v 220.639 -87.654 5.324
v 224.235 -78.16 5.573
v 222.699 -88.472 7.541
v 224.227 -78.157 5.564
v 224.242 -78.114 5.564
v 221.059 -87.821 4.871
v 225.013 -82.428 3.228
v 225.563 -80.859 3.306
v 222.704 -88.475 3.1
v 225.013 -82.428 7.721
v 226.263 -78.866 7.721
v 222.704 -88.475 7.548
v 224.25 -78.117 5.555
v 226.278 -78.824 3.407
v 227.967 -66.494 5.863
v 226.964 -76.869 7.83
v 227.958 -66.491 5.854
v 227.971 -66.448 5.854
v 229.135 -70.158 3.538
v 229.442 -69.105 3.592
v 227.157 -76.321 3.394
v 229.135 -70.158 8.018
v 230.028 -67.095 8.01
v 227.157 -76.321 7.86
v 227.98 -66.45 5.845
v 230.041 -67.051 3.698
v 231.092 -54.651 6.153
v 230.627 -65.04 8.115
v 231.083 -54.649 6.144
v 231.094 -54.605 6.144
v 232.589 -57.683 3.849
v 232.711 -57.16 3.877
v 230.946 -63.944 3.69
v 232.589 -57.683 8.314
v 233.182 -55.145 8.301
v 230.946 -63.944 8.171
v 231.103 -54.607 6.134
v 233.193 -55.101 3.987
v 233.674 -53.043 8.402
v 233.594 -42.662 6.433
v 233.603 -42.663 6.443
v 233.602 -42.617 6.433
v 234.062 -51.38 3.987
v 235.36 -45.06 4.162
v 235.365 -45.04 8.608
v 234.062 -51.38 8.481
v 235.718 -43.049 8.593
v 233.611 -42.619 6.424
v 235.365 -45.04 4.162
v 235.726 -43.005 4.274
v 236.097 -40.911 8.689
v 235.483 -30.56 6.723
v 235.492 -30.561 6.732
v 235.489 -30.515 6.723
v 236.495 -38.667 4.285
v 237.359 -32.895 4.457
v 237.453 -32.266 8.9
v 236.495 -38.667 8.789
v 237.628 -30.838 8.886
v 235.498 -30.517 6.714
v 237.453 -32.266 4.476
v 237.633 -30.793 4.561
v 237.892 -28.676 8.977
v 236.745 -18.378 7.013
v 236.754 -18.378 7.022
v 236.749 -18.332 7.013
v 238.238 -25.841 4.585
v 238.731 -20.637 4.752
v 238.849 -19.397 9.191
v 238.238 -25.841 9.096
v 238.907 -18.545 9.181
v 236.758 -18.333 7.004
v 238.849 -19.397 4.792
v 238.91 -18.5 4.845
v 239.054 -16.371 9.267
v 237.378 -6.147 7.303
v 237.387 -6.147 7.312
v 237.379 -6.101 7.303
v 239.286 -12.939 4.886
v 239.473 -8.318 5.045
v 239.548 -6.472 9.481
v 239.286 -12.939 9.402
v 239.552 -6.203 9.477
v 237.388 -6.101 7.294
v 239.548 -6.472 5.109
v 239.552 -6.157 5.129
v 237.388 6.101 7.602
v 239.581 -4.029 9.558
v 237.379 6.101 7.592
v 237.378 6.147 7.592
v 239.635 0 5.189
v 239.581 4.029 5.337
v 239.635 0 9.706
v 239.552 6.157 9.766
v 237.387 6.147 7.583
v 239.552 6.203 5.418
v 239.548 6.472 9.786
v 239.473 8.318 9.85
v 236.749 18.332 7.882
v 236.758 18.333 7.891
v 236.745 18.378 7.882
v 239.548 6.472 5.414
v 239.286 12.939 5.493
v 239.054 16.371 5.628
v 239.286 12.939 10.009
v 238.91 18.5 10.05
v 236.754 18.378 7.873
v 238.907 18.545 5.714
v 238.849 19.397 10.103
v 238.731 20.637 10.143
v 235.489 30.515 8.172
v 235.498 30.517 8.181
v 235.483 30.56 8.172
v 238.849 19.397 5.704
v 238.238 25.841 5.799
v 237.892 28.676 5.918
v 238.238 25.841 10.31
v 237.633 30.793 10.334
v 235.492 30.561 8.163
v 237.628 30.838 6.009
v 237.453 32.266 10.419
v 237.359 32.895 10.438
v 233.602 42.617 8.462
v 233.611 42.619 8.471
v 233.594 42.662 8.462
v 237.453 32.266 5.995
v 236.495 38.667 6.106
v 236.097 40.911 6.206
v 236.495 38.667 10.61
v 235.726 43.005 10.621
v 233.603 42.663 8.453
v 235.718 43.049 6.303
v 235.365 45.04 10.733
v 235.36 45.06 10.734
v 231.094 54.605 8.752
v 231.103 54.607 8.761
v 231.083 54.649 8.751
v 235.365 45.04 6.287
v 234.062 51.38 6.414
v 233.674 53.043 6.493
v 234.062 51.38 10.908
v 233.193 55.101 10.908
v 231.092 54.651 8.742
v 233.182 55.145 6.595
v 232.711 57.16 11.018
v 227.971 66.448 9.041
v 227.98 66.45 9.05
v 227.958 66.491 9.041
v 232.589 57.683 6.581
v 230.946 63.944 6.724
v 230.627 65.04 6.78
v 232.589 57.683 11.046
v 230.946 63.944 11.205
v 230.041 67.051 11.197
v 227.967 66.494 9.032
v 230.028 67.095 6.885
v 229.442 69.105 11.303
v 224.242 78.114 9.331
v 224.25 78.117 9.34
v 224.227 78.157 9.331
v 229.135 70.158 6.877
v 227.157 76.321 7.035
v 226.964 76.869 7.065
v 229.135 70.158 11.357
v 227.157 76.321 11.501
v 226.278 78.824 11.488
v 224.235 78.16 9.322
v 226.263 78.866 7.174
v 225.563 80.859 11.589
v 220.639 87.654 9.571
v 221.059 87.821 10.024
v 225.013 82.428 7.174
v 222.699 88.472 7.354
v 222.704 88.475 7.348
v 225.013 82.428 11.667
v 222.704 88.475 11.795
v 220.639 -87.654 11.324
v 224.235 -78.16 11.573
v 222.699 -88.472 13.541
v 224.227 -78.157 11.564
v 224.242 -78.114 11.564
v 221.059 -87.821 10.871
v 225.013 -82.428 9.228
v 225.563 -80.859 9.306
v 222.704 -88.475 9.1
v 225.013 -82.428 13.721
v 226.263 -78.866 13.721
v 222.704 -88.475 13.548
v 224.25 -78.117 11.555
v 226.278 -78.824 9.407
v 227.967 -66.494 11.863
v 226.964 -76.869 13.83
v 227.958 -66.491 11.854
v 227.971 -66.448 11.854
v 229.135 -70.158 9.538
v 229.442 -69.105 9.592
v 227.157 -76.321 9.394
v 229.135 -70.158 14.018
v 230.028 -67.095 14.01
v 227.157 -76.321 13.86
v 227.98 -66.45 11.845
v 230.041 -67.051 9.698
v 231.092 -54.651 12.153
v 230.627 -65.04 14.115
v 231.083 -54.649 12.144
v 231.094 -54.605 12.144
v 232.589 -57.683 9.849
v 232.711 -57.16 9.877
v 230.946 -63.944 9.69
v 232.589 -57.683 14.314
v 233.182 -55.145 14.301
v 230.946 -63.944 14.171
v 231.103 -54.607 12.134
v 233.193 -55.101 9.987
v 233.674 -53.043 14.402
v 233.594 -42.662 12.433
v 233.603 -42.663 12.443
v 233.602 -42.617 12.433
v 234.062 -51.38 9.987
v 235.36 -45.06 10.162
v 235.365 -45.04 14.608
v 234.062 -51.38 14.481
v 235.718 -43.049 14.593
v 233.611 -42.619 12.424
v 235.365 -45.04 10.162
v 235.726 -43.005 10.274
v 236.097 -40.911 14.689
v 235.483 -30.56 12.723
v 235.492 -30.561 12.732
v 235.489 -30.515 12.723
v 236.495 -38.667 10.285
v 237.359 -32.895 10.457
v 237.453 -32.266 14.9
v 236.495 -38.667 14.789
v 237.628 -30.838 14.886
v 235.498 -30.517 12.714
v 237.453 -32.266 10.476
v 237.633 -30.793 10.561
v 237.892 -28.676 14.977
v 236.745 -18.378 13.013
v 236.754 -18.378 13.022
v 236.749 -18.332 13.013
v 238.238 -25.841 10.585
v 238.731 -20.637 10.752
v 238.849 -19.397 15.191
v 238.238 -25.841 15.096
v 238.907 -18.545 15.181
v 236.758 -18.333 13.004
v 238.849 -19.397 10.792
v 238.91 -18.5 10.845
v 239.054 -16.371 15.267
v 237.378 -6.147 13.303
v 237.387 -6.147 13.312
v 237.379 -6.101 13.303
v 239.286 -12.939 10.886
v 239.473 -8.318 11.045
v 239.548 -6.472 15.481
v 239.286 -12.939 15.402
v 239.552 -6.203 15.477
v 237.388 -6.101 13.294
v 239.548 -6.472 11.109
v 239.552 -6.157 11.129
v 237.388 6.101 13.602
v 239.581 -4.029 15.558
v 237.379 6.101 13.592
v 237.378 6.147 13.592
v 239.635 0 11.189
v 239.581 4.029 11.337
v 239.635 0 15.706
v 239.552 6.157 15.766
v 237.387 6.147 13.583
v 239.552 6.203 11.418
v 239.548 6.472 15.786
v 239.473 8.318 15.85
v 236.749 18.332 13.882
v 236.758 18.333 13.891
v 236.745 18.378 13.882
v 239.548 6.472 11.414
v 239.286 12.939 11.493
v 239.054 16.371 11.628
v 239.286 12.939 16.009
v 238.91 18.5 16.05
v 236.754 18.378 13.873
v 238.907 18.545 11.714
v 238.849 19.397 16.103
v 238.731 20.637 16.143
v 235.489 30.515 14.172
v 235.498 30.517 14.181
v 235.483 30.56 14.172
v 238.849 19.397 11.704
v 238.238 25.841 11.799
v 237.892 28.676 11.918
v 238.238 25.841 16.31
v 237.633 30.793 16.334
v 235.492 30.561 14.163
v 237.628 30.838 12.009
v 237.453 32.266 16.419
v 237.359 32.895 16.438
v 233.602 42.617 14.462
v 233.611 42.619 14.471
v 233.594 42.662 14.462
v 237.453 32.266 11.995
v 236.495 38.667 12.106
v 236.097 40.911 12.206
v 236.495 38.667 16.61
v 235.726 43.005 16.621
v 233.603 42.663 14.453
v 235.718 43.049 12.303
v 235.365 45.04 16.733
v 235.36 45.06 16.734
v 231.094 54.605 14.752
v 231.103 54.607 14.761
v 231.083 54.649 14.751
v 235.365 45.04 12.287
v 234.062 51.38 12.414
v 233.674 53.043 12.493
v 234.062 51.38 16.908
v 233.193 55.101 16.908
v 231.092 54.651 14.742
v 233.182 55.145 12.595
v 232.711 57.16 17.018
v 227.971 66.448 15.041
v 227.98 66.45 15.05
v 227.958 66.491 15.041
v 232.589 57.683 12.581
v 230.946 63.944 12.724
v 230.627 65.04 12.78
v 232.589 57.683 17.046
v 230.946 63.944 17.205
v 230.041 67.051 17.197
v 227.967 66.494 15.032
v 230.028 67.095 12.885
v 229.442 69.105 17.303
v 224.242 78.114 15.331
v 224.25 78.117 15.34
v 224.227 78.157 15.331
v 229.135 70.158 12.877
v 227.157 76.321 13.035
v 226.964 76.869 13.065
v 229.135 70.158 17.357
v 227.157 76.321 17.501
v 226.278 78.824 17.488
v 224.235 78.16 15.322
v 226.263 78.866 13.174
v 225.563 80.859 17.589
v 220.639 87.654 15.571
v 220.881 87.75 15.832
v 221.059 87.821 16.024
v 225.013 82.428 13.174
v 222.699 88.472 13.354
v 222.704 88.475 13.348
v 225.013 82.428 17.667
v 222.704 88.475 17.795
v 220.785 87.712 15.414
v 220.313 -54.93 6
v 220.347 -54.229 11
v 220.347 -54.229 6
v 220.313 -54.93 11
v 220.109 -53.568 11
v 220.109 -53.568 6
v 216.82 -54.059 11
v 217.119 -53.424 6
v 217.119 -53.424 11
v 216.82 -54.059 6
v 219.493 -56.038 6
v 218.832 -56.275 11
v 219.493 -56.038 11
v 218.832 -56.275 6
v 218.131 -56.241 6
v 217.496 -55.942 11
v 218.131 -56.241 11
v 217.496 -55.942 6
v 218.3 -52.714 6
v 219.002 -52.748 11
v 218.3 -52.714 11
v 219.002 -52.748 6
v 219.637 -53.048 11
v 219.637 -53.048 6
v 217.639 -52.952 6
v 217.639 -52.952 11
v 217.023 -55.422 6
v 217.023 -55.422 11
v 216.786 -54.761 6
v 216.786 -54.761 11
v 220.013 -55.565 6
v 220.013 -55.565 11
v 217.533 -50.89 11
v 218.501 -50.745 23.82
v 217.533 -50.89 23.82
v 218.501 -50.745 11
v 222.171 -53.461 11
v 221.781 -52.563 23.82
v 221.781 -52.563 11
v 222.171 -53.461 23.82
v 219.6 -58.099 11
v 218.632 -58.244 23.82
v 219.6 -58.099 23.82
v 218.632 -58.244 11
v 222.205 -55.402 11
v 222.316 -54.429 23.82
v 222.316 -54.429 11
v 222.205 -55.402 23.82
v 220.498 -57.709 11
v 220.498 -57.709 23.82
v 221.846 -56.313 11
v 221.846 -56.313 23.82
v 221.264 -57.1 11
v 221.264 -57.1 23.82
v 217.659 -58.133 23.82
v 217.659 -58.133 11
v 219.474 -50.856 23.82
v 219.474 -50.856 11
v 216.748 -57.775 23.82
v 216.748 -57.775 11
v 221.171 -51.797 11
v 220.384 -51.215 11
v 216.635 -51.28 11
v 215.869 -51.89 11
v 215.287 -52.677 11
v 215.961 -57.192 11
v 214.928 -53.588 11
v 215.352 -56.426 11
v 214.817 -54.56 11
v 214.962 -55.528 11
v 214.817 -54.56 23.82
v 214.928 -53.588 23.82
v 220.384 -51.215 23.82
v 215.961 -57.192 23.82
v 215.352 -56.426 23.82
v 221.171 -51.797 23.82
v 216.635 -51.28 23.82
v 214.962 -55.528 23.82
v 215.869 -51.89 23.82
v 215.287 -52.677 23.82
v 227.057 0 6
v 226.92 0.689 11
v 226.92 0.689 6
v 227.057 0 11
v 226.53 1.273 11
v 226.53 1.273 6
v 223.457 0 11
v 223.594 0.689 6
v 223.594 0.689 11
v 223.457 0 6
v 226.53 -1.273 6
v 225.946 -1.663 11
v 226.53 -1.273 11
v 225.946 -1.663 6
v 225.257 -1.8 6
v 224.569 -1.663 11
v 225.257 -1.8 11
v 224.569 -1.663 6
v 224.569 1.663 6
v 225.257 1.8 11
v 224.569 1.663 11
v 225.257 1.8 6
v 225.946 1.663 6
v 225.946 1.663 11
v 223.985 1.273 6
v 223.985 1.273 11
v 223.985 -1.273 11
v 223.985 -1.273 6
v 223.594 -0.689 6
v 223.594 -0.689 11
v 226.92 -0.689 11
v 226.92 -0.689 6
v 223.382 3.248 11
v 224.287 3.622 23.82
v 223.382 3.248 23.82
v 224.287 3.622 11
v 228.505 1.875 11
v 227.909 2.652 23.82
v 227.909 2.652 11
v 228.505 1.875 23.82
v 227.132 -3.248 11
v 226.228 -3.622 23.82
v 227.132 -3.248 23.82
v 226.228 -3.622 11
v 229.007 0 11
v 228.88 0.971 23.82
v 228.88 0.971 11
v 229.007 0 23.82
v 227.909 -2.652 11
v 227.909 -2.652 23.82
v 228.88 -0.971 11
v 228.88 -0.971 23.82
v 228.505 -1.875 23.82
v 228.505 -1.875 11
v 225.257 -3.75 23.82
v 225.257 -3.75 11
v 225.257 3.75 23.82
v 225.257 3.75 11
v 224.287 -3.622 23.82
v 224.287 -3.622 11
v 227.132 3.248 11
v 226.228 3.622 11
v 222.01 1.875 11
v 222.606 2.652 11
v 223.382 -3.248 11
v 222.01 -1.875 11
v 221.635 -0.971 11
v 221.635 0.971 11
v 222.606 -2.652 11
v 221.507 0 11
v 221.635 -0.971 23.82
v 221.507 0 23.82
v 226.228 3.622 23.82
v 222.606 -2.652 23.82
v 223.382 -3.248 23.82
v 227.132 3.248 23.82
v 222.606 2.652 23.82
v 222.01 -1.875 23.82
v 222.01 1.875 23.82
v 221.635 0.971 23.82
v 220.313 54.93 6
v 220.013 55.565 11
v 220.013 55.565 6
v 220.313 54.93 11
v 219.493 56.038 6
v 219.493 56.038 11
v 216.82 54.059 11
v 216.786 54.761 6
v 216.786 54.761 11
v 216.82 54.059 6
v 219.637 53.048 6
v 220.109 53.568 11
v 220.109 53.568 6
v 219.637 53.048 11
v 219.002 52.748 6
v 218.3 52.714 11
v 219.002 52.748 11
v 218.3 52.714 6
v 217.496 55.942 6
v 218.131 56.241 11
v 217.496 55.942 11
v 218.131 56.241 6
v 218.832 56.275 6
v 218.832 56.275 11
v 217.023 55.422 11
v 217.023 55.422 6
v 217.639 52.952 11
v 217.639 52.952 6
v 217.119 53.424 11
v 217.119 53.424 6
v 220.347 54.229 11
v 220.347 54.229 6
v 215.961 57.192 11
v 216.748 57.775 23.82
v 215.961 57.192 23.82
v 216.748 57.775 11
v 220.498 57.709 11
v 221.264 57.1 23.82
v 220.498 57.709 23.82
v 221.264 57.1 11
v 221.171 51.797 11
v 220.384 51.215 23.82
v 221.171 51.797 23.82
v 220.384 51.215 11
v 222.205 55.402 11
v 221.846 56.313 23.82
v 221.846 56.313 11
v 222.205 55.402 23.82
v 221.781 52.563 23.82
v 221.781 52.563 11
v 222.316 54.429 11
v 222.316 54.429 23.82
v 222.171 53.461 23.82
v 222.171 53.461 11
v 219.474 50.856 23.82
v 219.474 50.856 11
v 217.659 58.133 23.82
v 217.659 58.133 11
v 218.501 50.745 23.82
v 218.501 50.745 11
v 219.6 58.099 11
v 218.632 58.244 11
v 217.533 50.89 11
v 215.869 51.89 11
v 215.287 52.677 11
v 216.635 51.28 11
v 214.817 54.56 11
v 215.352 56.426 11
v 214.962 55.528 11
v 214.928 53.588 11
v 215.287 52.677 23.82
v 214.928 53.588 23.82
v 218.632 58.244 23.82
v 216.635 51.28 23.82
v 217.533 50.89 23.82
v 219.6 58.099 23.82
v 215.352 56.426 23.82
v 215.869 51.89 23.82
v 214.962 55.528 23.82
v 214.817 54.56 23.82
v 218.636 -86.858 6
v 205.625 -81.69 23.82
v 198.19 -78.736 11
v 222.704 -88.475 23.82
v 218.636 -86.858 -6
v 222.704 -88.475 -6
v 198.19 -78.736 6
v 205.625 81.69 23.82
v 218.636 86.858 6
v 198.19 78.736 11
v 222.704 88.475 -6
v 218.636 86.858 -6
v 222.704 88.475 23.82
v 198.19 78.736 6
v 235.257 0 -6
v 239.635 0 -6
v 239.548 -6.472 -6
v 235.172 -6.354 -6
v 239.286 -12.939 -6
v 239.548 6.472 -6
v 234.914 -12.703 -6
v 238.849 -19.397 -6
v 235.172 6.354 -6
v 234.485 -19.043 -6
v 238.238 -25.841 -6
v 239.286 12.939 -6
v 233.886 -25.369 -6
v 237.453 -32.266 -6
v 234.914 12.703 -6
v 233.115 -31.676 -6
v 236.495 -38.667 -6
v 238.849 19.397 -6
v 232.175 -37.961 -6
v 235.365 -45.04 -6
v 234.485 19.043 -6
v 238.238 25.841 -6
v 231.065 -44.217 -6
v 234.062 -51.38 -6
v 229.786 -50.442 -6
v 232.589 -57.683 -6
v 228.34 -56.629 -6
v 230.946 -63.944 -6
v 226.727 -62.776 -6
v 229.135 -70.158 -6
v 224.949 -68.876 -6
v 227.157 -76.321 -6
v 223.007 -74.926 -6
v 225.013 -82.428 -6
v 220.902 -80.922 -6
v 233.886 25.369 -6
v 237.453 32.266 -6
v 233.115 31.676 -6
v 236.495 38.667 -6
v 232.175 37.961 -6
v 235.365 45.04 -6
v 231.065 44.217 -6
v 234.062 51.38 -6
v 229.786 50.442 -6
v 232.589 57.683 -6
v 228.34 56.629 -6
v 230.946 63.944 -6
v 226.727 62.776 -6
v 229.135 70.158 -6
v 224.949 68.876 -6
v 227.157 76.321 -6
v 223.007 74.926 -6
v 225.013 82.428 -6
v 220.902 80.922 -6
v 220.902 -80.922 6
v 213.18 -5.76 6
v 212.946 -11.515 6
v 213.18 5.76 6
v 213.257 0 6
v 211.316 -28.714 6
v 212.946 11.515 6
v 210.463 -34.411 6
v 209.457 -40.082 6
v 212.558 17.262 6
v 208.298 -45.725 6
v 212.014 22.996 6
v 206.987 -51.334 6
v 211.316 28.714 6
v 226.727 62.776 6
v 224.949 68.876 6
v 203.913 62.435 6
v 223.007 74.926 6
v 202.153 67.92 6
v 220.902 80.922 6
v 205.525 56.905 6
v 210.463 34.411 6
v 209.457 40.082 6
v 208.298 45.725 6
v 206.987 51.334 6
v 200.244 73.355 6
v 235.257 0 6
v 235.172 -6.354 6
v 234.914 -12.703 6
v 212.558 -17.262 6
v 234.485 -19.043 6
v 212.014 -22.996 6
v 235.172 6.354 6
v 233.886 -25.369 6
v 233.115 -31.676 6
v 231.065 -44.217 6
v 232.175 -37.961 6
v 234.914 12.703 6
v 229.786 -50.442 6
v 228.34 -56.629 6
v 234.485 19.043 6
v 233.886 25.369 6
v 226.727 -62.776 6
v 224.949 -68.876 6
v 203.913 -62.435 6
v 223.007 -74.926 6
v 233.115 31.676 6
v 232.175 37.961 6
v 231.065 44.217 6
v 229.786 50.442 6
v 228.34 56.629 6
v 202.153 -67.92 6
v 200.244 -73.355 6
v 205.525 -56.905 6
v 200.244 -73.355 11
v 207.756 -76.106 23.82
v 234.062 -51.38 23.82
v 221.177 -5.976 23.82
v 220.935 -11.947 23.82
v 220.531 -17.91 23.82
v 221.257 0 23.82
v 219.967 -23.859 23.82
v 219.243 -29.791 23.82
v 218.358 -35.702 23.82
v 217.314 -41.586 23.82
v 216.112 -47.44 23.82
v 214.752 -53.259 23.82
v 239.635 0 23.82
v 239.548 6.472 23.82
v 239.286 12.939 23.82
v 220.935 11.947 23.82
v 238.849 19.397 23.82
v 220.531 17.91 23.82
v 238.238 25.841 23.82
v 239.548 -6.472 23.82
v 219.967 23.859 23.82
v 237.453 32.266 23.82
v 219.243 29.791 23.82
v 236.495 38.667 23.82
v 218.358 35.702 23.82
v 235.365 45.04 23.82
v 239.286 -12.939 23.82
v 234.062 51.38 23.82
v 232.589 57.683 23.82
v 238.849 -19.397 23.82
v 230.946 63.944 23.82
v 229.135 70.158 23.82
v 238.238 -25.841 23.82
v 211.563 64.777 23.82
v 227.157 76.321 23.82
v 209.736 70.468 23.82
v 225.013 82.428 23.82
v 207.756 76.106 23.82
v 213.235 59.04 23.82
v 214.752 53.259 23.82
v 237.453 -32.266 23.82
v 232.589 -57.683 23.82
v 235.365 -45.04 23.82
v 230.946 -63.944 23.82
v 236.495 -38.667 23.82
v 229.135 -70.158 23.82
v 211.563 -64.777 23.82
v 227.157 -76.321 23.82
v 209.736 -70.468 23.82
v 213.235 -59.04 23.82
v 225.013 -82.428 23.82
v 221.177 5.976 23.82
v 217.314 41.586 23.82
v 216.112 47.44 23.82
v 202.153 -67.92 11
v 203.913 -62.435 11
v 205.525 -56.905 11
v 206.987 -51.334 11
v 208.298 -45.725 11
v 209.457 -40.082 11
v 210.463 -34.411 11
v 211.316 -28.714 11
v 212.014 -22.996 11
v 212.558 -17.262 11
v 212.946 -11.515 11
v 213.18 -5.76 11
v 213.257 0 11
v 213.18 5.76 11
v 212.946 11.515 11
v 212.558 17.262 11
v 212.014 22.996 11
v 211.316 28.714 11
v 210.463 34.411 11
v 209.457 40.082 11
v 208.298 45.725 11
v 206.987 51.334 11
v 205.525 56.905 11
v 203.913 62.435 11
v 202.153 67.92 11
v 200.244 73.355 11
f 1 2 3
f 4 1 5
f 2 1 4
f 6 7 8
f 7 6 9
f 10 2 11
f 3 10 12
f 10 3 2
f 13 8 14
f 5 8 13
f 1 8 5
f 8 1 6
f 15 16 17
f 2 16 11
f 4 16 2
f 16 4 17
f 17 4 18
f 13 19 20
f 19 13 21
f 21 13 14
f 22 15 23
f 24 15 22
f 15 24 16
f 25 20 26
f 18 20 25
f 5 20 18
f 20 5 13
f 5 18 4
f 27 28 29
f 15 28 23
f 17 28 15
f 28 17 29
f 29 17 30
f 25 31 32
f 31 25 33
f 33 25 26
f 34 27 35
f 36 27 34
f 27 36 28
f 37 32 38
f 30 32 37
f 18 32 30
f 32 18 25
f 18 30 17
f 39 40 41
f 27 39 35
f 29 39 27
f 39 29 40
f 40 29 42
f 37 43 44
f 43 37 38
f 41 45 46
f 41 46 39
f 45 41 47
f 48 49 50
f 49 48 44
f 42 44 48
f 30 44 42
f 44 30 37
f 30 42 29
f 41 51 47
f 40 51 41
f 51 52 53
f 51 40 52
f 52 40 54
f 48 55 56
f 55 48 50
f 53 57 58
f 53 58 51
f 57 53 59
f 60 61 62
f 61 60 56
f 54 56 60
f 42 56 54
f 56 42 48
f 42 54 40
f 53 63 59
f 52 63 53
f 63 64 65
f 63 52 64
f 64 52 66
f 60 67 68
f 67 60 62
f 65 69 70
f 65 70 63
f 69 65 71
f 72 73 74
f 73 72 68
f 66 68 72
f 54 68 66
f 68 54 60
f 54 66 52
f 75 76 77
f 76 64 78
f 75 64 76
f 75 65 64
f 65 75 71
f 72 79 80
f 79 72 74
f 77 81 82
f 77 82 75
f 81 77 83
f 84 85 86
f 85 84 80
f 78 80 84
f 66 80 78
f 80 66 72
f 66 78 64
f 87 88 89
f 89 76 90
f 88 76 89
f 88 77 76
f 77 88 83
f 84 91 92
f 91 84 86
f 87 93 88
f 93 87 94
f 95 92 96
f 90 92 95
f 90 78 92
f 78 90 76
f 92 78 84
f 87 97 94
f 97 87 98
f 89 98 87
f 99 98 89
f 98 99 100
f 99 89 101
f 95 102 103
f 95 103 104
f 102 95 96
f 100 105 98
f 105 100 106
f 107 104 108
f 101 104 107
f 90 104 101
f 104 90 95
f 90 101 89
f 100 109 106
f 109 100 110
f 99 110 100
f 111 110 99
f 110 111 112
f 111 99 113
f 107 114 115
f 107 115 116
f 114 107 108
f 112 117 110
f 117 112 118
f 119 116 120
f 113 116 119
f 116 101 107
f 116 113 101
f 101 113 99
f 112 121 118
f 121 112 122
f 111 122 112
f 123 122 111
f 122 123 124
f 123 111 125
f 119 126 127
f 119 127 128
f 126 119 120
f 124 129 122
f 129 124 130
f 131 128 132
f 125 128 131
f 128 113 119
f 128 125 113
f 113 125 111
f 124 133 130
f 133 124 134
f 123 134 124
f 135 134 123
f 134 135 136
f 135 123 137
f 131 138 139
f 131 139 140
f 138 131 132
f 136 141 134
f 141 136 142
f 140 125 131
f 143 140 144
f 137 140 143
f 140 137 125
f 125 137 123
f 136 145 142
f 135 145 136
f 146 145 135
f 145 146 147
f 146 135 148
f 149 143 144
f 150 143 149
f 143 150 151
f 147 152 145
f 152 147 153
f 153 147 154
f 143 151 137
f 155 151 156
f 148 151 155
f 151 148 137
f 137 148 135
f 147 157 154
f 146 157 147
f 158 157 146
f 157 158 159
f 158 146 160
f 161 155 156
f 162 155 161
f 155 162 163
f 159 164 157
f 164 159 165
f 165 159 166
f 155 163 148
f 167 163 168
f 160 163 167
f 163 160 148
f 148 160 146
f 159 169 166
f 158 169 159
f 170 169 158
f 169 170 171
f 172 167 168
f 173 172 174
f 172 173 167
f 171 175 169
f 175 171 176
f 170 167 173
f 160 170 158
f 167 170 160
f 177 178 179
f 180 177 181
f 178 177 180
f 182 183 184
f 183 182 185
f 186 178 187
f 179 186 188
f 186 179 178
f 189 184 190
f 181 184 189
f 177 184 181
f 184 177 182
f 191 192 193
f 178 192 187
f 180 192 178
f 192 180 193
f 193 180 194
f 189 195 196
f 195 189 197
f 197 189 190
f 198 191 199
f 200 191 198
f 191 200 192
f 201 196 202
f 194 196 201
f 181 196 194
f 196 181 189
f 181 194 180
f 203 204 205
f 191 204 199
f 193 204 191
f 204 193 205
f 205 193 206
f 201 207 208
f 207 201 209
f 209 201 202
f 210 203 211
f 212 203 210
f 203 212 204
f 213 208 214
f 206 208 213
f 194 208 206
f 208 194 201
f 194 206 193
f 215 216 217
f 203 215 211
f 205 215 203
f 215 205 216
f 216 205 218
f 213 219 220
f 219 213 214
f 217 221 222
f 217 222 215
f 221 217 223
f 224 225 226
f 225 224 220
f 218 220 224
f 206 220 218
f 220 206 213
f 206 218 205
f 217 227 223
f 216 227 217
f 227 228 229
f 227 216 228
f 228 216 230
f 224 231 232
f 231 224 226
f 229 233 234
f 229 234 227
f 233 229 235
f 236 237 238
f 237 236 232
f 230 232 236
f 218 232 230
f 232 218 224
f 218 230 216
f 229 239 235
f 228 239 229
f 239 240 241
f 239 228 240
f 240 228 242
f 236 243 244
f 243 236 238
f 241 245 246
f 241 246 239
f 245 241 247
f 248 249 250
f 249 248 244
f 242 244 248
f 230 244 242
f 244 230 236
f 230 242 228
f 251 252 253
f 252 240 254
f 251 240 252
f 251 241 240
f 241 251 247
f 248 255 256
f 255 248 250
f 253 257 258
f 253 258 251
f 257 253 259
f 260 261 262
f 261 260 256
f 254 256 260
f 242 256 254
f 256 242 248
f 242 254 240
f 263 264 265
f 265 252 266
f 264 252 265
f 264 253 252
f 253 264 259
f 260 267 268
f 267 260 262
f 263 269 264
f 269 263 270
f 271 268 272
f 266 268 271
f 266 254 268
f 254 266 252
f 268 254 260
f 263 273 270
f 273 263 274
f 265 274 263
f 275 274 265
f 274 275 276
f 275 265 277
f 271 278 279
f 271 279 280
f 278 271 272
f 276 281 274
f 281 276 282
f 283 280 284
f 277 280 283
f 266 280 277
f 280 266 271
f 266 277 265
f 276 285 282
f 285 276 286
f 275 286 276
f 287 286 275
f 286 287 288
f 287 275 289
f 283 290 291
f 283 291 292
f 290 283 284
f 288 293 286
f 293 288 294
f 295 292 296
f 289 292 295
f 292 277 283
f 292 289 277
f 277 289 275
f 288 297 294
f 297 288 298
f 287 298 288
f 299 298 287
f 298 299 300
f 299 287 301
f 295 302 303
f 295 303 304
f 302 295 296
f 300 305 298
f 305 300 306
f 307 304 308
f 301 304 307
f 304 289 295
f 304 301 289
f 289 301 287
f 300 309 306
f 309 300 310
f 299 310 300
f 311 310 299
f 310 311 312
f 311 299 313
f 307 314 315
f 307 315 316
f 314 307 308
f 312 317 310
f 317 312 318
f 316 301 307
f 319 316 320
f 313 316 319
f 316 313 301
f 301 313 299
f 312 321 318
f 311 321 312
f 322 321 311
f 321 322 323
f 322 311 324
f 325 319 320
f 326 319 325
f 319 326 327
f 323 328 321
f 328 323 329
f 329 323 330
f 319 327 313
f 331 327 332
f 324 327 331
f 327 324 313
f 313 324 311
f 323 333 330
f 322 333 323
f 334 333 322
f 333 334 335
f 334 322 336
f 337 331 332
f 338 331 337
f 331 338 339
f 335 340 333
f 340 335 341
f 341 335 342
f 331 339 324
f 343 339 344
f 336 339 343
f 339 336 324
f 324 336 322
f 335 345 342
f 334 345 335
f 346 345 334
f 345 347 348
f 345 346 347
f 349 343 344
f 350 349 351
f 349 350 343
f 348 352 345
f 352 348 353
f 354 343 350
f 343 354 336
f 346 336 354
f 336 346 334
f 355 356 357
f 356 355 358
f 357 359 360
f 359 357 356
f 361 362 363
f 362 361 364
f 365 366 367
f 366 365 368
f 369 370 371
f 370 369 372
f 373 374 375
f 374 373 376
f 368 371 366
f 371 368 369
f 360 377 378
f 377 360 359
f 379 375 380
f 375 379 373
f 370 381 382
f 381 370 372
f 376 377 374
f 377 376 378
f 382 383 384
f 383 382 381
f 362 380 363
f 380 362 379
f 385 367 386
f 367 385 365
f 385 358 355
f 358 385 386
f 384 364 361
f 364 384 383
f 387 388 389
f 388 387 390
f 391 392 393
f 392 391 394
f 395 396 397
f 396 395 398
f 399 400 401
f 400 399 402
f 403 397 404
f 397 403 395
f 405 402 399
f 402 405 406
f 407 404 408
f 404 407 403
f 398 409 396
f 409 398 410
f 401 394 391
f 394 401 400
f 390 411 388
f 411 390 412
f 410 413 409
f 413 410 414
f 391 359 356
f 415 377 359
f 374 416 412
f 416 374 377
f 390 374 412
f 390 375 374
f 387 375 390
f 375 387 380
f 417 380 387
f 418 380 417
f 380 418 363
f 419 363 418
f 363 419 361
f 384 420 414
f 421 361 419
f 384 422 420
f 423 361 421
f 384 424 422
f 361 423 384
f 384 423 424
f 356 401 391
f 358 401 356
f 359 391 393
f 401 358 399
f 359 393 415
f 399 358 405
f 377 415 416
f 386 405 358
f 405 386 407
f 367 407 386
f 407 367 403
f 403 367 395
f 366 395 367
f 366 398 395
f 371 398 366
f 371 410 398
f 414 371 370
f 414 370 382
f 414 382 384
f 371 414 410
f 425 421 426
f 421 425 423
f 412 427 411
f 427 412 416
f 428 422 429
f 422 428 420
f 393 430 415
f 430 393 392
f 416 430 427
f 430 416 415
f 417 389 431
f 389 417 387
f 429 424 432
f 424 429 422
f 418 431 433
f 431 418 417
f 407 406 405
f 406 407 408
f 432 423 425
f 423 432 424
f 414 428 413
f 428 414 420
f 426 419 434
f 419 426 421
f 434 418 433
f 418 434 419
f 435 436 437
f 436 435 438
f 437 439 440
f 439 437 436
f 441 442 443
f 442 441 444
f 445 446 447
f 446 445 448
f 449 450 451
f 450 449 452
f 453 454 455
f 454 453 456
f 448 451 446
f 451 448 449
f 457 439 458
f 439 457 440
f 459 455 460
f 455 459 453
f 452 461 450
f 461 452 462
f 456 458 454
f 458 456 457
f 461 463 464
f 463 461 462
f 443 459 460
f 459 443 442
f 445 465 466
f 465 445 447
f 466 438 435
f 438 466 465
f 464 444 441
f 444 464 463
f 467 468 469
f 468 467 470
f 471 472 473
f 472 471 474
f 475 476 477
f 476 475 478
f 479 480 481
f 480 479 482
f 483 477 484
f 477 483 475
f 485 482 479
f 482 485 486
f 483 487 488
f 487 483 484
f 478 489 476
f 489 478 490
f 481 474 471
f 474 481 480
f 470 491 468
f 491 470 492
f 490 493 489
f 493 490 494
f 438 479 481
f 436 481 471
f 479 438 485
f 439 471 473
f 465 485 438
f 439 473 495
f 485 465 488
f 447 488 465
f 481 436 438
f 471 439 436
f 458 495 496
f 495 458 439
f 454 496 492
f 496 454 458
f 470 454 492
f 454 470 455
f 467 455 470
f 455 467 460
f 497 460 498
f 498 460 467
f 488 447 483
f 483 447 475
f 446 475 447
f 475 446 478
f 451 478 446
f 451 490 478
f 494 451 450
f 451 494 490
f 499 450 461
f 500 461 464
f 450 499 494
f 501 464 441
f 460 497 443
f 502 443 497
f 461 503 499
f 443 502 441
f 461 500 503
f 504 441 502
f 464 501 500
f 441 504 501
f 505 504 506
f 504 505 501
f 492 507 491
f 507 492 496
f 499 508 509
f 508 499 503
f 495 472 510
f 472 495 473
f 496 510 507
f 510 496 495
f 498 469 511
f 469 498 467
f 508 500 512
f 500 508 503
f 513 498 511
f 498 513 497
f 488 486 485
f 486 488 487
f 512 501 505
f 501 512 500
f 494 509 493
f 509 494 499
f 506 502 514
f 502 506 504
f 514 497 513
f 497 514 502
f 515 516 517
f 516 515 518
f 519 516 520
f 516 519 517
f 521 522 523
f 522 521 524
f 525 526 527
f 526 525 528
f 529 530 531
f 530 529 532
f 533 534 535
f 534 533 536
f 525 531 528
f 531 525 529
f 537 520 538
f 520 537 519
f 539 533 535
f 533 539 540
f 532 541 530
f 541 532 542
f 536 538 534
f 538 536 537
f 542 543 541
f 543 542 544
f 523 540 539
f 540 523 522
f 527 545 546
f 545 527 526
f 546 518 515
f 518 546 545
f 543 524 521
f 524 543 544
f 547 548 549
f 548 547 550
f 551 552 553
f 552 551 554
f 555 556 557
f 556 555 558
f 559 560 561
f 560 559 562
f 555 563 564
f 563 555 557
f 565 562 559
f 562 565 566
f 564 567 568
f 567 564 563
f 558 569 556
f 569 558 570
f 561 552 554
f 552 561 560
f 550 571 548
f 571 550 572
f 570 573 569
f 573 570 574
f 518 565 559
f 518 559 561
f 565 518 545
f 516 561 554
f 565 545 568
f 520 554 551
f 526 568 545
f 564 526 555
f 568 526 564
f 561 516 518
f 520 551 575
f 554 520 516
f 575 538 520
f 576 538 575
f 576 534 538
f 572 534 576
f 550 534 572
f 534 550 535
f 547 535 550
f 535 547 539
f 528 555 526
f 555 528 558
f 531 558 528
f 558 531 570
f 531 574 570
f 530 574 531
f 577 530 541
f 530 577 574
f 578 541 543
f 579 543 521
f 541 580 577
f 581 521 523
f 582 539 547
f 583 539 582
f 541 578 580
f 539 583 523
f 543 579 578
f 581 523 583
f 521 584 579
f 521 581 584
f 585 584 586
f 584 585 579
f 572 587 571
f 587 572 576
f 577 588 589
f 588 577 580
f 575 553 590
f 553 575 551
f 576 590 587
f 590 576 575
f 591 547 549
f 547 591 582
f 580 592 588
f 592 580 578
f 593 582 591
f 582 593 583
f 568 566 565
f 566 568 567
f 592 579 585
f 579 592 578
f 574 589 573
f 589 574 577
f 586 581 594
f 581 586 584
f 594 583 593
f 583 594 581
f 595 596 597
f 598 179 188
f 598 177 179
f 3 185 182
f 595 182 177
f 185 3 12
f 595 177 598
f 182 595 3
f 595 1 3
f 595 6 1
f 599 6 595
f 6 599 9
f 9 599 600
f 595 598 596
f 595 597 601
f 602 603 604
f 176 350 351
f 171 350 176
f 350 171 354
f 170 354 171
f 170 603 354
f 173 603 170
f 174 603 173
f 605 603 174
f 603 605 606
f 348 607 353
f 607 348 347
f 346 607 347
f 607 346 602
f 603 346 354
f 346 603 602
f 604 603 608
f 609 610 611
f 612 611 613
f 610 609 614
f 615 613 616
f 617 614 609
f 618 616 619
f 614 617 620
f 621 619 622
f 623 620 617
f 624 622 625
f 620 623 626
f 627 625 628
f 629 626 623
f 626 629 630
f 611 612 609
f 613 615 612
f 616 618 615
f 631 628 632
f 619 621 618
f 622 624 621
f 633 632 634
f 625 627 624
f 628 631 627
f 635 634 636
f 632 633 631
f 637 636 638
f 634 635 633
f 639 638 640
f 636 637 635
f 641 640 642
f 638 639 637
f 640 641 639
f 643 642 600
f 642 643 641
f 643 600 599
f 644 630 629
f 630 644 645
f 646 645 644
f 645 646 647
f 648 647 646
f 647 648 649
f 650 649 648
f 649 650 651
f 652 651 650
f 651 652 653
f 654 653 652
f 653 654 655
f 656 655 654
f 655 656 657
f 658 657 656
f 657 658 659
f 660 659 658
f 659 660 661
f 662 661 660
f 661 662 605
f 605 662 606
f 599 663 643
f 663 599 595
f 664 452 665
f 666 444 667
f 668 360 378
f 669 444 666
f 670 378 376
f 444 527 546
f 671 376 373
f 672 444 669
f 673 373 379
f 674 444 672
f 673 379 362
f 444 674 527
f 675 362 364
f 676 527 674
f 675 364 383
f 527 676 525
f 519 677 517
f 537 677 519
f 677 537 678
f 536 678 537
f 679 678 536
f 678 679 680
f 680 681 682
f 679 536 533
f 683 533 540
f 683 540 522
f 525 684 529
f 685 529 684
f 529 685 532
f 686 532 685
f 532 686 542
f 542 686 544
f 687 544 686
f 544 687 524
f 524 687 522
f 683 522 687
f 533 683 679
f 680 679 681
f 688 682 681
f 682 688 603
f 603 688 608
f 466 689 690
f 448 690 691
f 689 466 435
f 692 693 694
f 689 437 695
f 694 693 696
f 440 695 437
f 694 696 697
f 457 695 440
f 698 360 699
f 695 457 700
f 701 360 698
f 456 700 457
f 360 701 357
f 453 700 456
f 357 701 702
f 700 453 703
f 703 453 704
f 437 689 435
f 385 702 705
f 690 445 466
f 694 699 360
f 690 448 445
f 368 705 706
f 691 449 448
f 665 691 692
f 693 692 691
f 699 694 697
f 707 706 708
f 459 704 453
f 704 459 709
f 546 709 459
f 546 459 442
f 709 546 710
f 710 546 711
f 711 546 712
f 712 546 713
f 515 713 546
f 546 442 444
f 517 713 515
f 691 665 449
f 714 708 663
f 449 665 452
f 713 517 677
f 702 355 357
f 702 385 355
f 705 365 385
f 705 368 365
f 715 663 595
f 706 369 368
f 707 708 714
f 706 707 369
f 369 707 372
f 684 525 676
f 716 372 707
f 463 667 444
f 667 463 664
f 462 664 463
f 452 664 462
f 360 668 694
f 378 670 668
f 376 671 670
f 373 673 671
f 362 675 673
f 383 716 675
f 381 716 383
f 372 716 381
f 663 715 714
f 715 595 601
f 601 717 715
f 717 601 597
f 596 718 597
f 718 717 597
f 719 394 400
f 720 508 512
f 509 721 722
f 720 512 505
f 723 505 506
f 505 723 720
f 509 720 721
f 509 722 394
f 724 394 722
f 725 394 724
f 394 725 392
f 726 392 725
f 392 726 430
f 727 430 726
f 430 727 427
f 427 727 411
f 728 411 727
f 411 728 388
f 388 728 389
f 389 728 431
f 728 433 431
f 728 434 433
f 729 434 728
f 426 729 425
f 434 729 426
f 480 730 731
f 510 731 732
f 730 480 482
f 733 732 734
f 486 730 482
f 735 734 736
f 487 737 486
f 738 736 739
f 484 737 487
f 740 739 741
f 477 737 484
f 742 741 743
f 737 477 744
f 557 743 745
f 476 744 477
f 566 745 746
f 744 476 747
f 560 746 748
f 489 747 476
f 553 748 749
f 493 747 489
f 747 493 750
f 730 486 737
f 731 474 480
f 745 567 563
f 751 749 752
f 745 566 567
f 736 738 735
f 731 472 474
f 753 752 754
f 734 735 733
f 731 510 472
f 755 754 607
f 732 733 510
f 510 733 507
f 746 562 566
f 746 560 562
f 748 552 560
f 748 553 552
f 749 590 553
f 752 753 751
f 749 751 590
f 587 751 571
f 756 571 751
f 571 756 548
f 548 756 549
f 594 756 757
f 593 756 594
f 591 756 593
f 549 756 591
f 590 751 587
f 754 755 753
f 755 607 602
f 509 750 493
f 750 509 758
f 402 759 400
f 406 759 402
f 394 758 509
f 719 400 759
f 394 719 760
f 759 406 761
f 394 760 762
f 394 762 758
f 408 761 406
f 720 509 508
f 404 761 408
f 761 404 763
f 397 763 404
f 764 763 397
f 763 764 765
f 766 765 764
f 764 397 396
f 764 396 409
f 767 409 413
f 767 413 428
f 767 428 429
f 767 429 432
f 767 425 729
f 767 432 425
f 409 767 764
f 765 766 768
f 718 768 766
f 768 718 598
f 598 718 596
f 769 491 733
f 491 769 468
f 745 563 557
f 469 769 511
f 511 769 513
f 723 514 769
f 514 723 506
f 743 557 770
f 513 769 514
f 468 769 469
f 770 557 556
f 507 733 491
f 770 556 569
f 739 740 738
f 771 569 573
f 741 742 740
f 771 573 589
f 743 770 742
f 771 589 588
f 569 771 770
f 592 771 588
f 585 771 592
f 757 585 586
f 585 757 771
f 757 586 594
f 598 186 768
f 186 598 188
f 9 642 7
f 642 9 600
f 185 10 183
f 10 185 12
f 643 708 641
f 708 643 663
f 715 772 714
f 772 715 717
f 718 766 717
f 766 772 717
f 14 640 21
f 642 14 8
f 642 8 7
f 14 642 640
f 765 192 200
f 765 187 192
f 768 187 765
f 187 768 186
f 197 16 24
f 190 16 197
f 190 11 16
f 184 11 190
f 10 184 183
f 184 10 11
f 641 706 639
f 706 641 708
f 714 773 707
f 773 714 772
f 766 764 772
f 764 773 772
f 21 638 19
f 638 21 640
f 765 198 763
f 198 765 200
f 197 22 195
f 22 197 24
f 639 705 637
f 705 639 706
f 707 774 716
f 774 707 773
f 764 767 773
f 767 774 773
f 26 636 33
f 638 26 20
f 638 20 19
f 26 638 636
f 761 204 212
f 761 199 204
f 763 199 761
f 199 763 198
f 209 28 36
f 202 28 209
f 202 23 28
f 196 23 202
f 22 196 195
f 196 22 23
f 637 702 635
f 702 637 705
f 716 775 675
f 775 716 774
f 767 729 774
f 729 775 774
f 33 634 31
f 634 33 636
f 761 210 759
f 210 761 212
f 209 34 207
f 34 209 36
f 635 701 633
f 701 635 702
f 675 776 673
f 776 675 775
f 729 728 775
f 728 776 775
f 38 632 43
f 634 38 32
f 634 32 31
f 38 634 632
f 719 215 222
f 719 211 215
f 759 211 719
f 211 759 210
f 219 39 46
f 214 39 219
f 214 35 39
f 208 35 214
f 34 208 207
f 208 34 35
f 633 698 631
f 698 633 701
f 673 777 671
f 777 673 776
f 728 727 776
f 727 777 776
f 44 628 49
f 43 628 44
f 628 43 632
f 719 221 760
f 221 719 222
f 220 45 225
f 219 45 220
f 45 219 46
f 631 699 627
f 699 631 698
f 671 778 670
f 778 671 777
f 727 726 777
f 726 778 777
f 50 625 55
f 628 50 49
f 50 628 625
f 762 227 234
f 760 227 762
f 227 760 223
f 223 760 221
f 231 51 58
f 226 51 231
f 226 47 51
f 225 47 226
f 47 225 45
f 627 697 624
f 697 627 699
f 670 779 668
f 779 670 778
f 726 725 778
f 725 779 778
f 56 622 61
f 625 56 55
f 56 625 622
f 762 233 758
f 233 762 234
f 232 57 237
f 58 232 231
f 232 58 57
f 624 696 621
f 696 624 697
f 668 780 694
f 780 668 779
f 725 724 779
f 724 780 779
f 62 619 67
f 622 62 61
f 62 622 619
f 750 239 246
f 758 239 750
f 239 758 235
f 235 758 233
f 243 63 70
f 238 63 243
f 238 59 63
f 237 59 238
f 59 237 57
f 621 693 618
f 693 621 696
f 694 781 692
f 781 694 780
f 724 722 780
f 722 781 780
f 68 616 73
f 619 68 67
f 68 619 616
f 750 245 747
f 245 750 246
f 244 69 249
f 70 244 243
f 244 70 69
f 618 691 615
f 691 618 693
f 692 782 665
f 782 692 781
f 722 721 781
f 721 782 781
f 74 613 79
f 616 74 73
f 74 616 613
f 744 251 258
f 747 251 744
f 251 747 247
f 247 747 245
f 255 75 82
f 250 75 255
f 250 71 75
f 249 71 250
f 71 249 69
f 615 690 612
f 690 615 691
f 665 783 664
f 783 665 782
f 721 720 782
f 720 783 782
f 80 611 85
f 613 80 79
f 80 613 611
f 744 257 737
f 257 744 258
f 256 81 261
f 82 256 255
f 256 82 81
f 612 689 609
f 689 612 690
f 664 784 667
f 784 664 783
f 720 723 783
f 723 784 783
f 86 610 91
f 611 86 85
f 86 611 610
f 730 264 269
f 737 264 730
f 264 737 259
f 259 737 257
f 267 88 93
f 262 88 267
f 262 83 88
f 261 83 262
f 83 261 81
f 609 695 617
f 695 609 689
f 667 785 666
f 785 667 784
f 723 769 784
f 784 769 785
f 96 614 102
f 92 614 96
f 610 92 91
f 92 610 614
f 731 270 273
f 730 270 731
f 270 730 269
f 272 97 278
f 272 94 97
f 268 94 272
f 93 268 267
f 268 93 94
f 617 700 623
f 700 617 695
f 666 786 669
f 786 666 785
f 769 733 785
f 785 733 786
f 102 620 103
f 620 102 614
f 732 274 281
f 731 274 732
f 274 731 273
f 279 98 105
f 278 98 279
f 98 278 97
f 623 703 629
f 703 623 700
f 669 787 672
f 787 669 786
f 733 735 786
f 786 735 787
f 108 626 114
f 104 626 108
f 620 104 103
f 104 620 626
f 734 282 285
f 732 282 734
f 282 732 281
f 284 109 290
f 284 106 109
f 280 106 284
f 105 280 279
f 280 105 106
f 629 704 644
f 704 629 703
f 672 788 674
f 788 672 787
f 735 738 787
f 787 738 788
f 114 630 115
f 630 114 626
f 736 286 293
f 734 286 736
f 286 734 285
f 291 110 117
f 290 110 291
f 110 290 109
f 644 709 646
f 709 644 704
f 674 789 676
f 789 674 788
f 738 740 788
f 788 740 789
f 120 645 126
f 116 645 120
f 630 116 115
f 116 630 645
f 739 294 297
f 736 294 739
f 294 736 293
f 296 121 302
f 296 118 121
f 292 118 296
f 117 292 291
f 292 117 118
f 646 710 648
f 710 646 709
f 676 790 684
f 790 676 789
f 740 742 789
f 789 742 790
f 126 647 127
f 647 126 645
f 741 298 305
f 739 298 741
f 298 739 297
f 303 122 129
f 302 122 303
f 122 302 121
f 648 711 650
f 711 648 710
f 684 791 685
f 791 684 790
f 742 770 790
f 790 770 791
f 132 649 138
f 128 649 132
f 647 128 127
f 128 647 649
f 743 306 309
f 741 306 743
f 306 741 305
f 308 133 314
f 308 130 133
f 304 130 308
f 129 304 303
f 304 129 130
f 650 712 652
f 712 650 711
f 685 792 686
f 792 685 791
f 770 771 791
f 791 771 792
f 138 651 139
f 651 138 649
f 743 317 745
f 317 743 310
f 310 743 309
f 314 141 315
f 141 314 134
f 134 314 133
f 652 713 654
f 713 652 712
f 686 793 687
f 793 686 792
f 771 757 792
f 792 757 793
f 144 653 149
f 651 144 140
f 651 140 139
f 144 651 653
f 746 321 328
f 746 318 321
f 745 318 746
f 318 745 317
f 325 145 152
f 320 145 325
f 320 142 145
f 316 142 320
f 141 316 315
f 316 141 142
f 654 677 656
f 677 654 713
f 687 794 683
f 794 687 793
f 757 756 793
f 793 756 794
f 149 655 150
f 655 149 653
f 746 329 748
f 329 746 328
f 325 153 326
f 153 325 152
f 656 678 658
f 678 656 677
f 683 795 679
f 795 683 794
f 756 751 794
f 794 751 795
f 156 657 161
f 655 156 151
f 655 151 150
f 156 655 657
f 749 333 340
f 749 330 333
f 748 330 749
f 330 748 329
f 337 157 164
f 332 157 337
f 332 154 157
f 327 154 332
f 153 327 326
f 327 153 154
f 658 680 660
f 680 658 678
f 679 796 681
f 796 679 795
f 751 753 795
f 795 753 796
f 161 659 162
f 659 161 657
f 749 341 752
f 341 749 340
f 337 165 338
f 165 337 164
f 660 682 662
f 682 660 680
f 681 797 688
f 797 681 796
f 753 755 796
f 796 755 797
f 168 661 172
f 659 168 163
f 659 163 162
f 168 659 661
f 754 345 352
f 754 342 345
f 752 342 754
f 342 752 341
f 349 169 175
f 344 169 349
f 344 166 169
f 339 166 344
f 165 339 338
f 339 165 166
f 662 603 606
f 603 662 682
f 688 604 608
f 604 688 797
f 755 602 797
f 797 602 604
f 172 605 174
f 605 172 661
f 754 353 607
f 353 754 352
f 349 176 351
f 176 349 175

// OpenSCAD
// Printed capstan channel segment for a plain CIRCULAR ply rim (in
// the arm: the left base board's sector web), WEDGE-BACKED: the
// TWO-TRACK band seats flush ON the rim, so cable tension presses
// printed part onto wood; outboard of the board face the section
// fills solid from the band down past the rim to the leg — radial
// backing for the track loads — and the leg lands on the OUTBOARD
// ply face with three wood screws, each at the bottom of a deep
// counterbore reaching in from the outboard end face. The band is
// ONE-SIDED: flush with the arm-side face (band_z0), growing
// outboard, per the flush stack-up (params).
//
// The two track slots are 45-deg V's that climb across the arc at the
// shared ~1.4 deg lead (track_z in params.scad): the sector-side lay
// is positively located, the free spans leave square (zero fleet),
// and the V self-centers the cord. The ramp direction must match the
// drum groove's hand (params wrap-math note).
//
// Three ~180 mm prints: -D idx=<0..seg_n-1>. On the end prints the
// anchored run's slot STOPS 2 deg short of the arc end — the
// remaining band IS the anchor abutment: the cord continues through a
// 2.2 hole in line with its track and knots in a shallow recess on
// the segment END face, load path straight along the cord, no bend.
// Run A anchors at the idx-0 end, run B at the far end, the tracks'
// diagonal extremes; the other track runs wall-to-wall (its cable
// never reaches that end anyway). TWO SEPARATE CABLES (params
// wrap-math note): each run's other end knots at its own drum core
// end, not at a shared mid-drum pin — which is why the tracks now sit
// only track_sep apart, and why the band's inboard wall is dead_w
// wider than the outboard one (it faces the drum's inboard anchor +
// dead-wrap zone, where no cable ever lands on the sector).
//
// Print INVERTED, on the wide outboard end face: the arc lies in the
// bed plane, the V walls and the wedge diagonal print at >= 45 deg,
// the leg's board-side land faces UP, and the counterbores rise
// straight off the bed — no support anywhere.
//
// Local frame: arc bisector on +X, joint axis = Z.

include <params.scad>
use <../lib/helpers.scad>

idx = 1;                      // which segment (0..seg_n-1); -D override

half = seg_ang / 2;

// this segment's bisector on the sector arc (deg from the arc bisector)
function seg_bis(i) = -sector_angle / 2 + (i + 0.5) * seg_ang;

// r-z cross-section: track band over the rim; outboard of the board
// face the section fills SOLID down to the leg, closed by the print
// diagonal from the leg's reach up to the wide outboard end face
module seg_profile() polygon([
  [rim_r, band_z0], [crest_r, band_z0],
  [crest_r, band_z0 + band_wt],
  [rim_r - seg_back, band_z0 + band_wt],       // wide outboard face
  [rim_r - leg_d, sector_core_t / 2 + leg_t],  // print diagonal
  [rim_r - leg_d, sector_core_t / 2], [rim_r, sector_core_t / 2]]);

// one track slot: pairwise hulls of thin V slabs step the ramp —
// exact, since the ramp is linear in arc angle
module track_slot(i, run, a0, a1) {
  n = max(2, ceil((a1 - a0) / 3));
  for (k = [0 : n - 1]) hull() {
    slot_slab(i, run, a0 + k * (a1 - a0) / n);
    slot_slab(i, run, a0 + (k + 1) * (a1 - a0) / n);
  }
}
// the V cross-section (apex inward), stood tangentially thin at
// local angle a
module slot_slab(i, run, a) rz(a) rx(90)
  linear_extrude(0.05, center = true)
    polygon(let (zt = track_z(a + seg_bis(i), run),
                 o = (crest_r + 0.5 - apex_r) * tan(v_half))
      [[apex_r, zt], [crest_r + 0.5, zt + o], [crest_r + 0.5, zt - o]]);

module sector_segment(i = idx, end = 0) {
  za = track_z(end * half + seg_bis(i), end);  // anchored track's
                                               // station at the end face
  difference() {
    // the wedge section, swept over this segment's arc
    rz(-half) rotate_extrude(angle = seg_ang, $fn = $twin ? 90 : 240) seg_profile();
    // track slots: the ANCHORED one stops 2 deg short of its arc end,
    // leaving the band itself as the anchor abutment
    track_slot(i, -1, end == -1 ? -half + 2 : -half - 0.5, half + 0.5);
    track_slot(i,  1, -half - 0.5, end == 1 ? half - 2 : half + 0.5);
    // leg screws into the ply face: shaft hole through the leg, head
    // at the bottom of a deep counterbore reaching in from the
    // outboard end face
    rz([-14, 0, 14]) tx(leg_screw_r) {
      tz(sector_core_t / 2 - 0.5)
        cylinder(d = leg_screw_d, h = leg_t + 1, $fn = 16);
      tz(sector_core_t / 2 + leg_t)
        cylinder(d = cb_d, h = band_z0 + band_wt + 1
                 - sector_core_t / 2 - leg_t, $fn = 24);
    }
    // anchor: the cord continues from the slot end through a 2.2 hole
    // in line with its track and knots in a shallow recess on the
    // segment END face — pull is straight along the cord, the knot is
    // tied in the open and seats as it tensions. (In the arm, the
    // lower end's knot sits in the board plane: nick the left board's
    // gusset corner to clear it.)
    if (end != 0) rz(end * half) tx(sector_eff_r) tz(za) {
      ty(-10) rx(-90) cylinder(d = 2.2, h = 16, $fn = 16);
      ty(-3) rx(-90) cylinder(d = 7, h = 6, $fn = 24);
    }
    // ALTERNATIVE anchor, outboard end only: a RADIAL hole just
    // forward of the slot stop — the cord dives from the track floor
    // through the wedge and knots against the inner (diagonal) face,
    // which is open air at run B's station. Either anchor can be
    // used. Run A's end gets no radial hole: its track rides the
    // board plane, so the hole would exit into the ply seat.
    if (end == 1) rz(half - 3) tz(track_z(half - 3 + seg_bis(i), 1))
      tx(218) ry(90) cylinder(d = 2.2, h = 22, $fn = 16);
  }
}

sector_segment(idx, idx == 0 ? -1 : idx == seg_n - 1 ? 1 : 0);
